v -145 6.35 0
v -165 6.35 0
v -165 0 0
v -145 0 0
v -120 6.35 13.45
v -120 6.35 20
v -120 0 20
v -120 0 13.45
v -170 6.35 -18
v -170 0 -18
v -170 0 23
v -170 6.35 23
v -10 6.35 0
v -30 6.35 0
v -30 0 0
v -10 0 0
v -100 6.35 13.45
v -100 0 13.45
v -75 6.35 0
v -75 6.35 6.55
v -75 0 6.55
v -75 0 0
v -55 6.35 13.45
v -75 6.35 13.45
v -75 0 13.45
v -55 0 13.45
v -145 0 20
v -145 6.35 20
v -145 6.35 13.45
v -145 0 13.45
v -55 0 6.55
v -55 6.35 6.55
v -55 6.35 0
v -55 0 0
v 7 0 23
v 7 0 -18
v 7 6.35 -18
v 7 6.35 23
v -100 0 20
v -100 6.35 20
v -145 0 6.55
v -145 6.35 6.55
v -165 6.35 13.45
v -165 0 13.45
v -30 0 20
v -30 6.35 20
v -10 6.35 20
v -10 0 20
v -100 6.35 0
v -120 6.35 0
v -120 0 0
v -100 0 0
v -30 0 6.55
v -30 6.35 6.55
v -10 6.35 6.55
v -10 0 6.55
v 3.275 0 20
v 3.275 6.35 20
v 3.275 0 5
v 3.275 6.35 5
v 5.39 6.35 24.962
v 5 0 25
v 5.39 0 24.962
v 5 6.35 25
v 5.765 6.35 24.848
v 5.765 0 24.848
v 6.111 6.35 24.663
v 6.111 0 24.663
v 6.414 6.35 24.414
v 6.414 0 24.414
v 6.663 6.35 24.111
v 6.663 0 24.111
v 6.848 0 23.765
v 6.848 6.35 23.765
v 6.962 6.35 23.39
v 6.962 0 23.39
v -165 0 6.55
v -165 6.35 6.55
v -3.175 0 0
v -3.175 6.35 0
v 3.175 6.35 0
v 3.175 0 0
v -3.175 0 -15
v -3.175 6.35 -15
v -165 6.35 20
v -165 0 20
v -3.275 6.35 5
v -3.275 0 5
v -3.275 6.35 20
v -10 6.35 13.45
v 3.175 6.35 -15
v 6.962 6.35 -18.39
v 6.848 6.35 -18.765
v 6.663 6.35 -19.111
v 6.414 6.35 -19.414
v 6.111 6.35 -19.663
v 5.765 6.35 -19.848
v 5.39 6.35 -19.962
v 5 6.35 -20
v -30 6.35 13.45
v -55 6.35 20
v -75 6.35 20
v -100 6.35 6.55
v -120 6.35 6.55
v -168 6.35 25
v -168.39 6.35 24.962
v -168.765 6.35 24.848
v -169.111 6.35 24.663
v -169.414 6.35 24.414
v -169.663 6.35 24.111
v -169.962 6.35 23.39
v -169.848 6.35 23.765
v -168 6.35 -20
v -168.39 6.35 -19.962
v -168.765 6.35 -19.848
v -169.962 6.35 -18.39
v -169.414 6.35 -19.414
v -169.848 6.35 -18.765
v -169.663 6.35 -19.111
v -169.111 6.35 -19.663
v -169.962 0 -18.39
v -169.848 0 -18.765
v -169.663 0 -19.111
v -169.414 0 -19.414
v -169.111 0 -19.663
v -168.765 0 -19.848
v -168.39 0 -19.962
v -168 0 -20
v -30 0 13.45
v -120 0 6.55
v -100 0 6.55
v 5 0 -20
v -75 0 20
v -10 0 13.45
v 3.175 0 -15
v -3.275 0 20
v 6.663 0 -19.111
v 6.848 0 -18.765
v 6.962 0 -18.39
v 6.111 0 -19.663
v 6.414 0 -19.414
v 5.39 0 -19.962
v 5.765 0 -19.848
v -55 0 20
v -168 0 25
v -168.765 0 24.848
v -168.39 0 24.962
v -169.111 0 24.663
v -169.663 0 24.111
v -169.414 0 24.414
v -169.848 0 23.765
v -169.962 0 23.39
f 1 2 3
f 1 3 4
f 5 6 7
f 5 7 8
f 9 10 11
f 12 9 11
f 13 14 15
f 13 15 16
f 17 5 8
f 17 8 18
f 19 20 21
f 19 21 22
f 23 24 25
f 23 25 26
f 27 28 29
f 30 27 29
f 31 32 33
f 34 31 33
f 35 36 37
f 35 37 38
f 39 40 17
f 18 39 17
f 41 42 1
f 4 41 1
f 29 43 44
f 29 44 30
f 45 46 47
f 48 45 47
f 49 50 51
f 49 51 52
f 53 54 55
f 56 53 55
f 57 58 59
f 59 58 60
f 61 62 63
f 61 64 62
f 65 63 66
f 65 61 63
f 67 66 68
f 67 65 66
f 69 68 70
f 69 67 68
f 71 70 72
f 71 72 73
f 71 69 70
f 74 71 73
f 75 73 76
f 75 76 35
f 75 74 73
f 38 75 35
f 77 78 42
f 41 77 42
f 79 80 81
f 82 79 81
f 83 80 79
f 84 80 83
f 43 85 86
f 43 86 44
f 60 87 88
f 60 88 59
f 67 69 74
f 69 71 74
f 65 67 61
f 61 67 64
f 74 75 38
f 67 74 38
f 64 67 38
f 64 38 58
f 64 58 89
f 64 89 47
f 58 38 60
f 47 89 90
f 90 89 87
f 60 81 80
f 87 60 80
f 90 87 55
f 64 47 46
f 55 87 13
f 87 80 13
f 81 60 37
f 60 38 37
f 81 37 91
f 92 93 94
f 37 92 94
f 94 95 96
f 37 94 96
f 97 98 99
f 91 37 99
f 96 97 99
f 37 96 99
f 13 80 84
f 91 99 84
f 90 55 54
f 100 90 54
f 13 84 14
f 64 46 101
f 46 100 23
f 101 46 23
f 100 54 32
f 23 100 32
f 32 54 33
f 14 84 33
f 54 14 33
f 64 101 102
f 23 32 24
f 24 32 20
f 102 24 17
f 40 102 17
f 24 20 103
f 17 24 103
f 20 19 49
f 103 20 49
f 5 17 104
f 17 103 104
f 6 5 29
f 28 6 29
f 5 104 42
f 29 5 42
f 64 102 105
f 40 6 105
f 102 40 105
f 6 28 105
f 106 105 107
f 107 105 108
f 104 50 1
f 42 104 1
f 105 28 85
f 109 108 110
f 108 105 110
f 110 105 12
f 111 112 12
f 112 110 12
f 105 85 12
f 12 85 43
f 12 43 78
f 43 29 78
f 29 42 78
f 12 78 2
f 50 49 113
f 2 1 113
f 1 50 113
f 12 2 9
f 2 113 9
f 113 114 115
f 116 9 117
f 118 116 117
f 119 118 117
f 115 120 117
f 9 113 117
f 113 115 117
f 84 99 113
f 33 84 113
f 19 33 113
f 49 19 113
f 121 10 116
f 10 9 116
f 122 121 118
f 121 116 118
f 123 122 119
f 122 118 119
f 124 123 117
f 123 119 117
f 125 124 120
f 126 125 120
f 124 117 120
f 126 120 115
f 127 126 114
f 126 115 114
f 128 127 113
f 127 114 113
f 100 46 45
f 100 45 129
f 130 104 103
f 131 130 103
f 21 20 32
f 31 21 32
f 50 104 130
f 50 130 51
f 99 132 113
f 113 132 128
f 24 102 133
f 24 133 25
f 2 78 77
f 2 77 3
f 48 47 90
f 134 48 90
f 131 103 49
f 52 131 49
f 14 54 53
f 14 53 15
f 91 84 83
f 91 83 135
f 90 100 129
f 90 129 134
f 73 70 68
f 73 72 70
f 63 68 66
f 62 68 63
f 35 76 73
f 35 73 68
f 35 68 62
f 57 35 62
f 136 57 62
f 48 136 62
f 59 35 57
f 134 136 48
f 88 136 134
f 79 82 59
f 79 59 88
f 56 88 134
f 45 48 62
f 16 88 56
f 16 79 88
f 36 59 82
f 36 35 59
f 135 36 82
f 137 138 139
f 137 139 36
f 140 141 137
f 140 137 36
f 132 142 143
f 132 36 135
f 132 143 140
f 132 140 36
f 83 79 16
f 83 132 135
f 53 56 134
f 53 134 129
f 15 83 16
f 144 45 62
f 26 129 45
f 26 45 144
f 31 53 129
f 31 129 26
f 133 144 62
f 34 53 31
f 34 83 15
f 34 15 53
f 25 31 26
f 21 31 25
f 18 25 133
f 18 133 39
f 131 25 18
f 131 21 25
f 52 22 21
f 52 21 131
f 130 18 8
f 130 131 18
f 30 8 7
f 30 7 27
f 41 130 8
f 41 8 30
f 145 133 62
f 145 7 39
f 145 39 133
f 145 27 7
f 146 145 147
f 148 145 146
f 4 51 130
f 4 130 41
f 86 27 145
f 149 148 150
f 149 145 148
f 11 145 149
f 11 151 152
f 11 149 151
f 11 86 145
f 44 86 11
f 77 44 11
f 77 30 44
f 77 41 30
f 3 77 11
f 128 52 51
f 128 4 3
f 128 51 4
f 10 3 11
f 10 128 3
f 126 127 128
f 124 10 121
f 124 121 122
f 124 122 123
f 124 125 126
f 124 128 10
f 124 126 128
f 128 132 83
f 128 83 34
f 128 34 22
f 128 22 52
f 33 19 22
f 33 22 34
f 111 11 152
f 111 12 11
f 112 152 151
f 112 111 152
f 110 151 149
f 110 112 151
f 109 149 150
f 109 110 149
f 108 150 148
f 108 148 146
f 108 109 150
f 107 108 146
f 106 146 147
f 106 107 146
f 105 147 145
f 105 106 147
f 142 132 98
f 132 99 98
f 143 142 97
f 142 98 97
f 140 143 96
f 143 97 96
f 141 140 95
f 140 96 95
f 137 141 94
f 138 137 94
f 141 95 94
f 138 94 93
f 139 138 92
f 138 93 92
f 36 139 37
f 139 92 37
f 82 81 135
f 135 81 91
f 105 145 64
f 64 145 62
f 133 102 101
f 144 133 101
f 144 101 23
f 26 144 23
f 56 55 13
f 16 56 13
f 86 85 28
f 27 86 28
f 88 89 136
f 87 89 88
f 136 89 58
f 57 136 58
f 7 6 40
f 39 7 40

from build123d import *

# Parameters (mm, degrees)
BOSS_EXTRUDE1_DEPTH = 6.35
SKETCH2_W           = 20
SKETCH2_H           = 6.55
CUT_EXTRUDE1_DEPTH  = 172.94569637
SKETCH4_W           = 6.55
SKETCH4_H           = 15
SKETCH4_W_2         = 6.35
CUT_EXTRUDE2_DEPTH  = 172.94569637
FILLET1_R           = 2


with BuildPart() as part:
    # Sketch1 → Boss-Extrude1 (new body)
    with BuildSketch(Plane(origin=(0, 0, 0), x_dir=(1, 0, 0), z_dir=(0, 1, 0))):
        Polygon((-170, 0), (-170, 20), (0, 20), (7, 20), (7, -25), (0, -25), (-170, -25), align=None)
    extrude(amount=BOSS_EXTRUDE1_DEPTH)

    # Sketch2 → Cut-Extrude1 (cut, through all)
    with BuildSketch(Plane(origin=(0, 6.35, 0), x_dir=(1, 0, 0), z_dir=(0, 1, 0))):
        with Locations((-110, -16.725)):
            Rectangle(SKETCH2_W, SKETCH2_H)
        with Locations((-155, -16.725)):
            Rectangle(SKETCH2_W, SKETCH2_H)
        with Locations((-65, -16.725)):
            Rectangle(SKETCH2_W, SKETCH2_H)
        with Locations((-20, -16.725)):
            Rectangle(SKETCH2_W, SKETCH2_H)
        with Locations((-110, -3.275)):
            Rectangle(SKETCH2_W, SKETCH2_H)
        with Locations((-155, -3.275)):
            Rectangle(SKETCH2_W, SKETCH2_H)
        with Locations((-65, -3.275)):
            Rectangle(SKETCH2_W, SKETCH2_H)
        with Locations((-20, -3.275)):
            Rectangle(SKETCH2_W, SKETCH2_H)
    extrude(amount=-CUT_EXTRUDE1_DEPTH, mode=Mode.SUBTRACT)

    # Sketch4 → Cut-Extrude2 (cut, through all)
    with BuildSketch(Plane(origin=(0, 6.35, 0), x_dir=(1, 0, 0), z_dir=(0, 1, 0))):
        with Locations((0, -12.5)):
            Rectangle(SKETCH4_W, SKETCH4_H)
        with Locations((0, 7.5)):
            Rectangle(SKETCH4_W_2, SKETCH4_H)
    extrude(amount=-CUT_EXTRUDE2_DEPTH, mode=Mode.SUBTRACT)

    # Fillet1
    fillet1_edges = [part.edges().sort_by_distance(p)[0] for p in [
        (7, 3.175, -20),
        (7, 3.175, 25),
        (-170, 3.175, 25),
        (-170, 3.175, -20),
    ]]
    fillet(fillet1_edges, radius=FILLET1_R)


solid = part.part
